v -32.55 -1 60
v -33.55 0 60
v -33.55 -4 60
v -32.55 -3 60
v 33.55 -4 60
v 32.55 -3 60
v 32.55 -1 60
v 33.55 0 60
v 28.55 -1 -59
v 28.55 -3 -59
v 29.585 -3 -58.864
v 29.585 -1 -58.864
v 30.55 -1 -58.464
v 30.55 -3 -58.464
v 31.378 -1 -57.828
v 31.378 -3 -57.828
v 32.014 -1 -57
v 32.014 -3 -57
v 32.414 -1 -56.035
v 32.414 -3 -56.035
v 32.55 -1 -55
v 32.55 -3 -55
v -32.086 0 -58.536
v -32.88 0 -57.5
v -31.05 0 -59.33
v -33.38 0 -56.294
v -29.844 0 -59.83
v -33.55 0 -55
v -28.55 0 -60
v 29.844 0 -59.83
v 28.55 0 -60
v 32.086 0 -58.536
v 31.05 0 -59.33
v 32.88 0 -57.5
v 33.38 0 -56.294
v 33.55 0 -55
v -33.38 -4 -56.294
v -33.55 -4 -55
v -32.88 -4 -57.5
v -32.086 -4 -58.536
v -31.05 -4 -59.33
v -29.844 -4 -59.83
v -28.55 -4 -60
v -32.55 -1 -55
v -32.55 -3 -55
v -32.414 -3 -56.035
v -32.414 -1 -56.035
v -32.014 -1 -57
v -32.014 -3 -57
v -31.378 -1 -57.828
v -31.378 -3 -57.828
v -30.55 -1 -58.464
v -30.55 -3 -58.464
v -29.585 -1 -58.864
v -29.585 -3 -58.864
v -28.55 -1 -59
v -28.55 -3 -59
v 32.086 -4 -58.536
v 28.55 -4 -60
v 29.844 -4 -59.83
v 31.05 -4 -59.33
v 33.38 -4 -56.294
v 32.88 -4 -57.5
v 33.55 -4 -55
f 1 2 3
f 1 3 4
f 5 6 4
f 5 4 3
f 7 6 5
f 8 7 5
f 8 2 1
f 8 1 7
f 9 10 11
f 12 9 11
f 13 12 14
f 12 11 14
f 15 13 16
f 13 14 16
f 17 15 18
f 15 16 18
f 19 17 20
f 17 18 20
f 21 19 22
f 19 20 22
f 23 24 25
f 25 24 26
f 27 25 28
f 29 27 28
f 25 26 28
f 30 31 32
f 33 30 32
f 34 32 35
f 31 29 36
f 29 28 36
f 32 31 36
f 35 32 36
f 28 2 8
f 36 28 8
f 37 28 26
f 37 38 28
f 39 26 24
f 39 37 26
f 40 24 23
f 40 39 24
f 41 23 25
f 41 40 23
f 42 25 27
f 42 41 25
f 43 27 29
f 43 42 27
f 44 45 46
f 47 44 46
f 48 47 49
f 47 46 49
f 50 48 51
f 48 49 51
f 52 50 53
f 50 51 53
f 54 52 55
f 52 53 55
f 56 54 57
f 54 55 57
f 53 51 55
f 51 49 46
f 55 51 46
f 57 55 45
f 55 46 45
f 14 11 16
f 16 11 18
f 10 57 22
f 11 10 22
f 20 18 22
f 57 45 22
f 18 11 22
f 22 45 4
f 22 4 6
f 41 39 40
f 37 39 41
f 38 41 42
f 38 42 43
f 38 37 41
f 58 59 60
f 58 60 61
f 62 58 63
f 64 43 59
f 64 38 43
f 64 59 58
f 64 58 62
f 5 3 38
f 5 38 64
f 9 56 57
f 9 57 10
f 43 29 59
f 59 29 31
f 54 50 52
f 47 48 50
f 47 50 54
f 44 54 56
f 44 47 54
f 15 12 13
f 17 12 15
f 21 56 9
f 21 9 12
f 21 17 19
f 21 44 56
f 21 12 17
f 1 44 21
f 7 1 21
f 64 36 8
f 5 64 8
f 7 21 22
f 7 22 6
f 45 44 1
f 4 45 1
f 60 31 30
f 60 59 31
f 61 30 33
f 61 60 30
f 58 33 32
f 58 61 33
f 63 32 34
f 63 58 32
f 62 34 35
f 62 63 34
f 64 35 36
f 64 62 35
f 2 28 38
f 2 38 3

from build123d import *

# Parameters (mm, degrees)
F0_W     = 67.1
F0_H     = 120
F1_DEPTH = 4
F2_R     = 5
F3_T     = -1


with BuildPart() as f1:
    # F0 (on Front) → F1 (new body)
    with BuildSketch(Plane.XZ):
        Rectangle(F0_W, F0_H)
    extrude(amount=F1_DEPTH)

    # F2
    f2_edges = [f1.edges().sort_by_distance(p)[0] for p in [
        (33.55, -2, -60),
        (-33.55, -2, -60),
    ]]
    fillet(f2_edges, radius=F2_R)

    # F3
    f3_openings = [f1.faces().sort_by_distance(p)[0] for p in [
        (0, -2, 60),
    ]]
    offset(amount=F3_T, openings=f3_openings)


solid = f1.part
